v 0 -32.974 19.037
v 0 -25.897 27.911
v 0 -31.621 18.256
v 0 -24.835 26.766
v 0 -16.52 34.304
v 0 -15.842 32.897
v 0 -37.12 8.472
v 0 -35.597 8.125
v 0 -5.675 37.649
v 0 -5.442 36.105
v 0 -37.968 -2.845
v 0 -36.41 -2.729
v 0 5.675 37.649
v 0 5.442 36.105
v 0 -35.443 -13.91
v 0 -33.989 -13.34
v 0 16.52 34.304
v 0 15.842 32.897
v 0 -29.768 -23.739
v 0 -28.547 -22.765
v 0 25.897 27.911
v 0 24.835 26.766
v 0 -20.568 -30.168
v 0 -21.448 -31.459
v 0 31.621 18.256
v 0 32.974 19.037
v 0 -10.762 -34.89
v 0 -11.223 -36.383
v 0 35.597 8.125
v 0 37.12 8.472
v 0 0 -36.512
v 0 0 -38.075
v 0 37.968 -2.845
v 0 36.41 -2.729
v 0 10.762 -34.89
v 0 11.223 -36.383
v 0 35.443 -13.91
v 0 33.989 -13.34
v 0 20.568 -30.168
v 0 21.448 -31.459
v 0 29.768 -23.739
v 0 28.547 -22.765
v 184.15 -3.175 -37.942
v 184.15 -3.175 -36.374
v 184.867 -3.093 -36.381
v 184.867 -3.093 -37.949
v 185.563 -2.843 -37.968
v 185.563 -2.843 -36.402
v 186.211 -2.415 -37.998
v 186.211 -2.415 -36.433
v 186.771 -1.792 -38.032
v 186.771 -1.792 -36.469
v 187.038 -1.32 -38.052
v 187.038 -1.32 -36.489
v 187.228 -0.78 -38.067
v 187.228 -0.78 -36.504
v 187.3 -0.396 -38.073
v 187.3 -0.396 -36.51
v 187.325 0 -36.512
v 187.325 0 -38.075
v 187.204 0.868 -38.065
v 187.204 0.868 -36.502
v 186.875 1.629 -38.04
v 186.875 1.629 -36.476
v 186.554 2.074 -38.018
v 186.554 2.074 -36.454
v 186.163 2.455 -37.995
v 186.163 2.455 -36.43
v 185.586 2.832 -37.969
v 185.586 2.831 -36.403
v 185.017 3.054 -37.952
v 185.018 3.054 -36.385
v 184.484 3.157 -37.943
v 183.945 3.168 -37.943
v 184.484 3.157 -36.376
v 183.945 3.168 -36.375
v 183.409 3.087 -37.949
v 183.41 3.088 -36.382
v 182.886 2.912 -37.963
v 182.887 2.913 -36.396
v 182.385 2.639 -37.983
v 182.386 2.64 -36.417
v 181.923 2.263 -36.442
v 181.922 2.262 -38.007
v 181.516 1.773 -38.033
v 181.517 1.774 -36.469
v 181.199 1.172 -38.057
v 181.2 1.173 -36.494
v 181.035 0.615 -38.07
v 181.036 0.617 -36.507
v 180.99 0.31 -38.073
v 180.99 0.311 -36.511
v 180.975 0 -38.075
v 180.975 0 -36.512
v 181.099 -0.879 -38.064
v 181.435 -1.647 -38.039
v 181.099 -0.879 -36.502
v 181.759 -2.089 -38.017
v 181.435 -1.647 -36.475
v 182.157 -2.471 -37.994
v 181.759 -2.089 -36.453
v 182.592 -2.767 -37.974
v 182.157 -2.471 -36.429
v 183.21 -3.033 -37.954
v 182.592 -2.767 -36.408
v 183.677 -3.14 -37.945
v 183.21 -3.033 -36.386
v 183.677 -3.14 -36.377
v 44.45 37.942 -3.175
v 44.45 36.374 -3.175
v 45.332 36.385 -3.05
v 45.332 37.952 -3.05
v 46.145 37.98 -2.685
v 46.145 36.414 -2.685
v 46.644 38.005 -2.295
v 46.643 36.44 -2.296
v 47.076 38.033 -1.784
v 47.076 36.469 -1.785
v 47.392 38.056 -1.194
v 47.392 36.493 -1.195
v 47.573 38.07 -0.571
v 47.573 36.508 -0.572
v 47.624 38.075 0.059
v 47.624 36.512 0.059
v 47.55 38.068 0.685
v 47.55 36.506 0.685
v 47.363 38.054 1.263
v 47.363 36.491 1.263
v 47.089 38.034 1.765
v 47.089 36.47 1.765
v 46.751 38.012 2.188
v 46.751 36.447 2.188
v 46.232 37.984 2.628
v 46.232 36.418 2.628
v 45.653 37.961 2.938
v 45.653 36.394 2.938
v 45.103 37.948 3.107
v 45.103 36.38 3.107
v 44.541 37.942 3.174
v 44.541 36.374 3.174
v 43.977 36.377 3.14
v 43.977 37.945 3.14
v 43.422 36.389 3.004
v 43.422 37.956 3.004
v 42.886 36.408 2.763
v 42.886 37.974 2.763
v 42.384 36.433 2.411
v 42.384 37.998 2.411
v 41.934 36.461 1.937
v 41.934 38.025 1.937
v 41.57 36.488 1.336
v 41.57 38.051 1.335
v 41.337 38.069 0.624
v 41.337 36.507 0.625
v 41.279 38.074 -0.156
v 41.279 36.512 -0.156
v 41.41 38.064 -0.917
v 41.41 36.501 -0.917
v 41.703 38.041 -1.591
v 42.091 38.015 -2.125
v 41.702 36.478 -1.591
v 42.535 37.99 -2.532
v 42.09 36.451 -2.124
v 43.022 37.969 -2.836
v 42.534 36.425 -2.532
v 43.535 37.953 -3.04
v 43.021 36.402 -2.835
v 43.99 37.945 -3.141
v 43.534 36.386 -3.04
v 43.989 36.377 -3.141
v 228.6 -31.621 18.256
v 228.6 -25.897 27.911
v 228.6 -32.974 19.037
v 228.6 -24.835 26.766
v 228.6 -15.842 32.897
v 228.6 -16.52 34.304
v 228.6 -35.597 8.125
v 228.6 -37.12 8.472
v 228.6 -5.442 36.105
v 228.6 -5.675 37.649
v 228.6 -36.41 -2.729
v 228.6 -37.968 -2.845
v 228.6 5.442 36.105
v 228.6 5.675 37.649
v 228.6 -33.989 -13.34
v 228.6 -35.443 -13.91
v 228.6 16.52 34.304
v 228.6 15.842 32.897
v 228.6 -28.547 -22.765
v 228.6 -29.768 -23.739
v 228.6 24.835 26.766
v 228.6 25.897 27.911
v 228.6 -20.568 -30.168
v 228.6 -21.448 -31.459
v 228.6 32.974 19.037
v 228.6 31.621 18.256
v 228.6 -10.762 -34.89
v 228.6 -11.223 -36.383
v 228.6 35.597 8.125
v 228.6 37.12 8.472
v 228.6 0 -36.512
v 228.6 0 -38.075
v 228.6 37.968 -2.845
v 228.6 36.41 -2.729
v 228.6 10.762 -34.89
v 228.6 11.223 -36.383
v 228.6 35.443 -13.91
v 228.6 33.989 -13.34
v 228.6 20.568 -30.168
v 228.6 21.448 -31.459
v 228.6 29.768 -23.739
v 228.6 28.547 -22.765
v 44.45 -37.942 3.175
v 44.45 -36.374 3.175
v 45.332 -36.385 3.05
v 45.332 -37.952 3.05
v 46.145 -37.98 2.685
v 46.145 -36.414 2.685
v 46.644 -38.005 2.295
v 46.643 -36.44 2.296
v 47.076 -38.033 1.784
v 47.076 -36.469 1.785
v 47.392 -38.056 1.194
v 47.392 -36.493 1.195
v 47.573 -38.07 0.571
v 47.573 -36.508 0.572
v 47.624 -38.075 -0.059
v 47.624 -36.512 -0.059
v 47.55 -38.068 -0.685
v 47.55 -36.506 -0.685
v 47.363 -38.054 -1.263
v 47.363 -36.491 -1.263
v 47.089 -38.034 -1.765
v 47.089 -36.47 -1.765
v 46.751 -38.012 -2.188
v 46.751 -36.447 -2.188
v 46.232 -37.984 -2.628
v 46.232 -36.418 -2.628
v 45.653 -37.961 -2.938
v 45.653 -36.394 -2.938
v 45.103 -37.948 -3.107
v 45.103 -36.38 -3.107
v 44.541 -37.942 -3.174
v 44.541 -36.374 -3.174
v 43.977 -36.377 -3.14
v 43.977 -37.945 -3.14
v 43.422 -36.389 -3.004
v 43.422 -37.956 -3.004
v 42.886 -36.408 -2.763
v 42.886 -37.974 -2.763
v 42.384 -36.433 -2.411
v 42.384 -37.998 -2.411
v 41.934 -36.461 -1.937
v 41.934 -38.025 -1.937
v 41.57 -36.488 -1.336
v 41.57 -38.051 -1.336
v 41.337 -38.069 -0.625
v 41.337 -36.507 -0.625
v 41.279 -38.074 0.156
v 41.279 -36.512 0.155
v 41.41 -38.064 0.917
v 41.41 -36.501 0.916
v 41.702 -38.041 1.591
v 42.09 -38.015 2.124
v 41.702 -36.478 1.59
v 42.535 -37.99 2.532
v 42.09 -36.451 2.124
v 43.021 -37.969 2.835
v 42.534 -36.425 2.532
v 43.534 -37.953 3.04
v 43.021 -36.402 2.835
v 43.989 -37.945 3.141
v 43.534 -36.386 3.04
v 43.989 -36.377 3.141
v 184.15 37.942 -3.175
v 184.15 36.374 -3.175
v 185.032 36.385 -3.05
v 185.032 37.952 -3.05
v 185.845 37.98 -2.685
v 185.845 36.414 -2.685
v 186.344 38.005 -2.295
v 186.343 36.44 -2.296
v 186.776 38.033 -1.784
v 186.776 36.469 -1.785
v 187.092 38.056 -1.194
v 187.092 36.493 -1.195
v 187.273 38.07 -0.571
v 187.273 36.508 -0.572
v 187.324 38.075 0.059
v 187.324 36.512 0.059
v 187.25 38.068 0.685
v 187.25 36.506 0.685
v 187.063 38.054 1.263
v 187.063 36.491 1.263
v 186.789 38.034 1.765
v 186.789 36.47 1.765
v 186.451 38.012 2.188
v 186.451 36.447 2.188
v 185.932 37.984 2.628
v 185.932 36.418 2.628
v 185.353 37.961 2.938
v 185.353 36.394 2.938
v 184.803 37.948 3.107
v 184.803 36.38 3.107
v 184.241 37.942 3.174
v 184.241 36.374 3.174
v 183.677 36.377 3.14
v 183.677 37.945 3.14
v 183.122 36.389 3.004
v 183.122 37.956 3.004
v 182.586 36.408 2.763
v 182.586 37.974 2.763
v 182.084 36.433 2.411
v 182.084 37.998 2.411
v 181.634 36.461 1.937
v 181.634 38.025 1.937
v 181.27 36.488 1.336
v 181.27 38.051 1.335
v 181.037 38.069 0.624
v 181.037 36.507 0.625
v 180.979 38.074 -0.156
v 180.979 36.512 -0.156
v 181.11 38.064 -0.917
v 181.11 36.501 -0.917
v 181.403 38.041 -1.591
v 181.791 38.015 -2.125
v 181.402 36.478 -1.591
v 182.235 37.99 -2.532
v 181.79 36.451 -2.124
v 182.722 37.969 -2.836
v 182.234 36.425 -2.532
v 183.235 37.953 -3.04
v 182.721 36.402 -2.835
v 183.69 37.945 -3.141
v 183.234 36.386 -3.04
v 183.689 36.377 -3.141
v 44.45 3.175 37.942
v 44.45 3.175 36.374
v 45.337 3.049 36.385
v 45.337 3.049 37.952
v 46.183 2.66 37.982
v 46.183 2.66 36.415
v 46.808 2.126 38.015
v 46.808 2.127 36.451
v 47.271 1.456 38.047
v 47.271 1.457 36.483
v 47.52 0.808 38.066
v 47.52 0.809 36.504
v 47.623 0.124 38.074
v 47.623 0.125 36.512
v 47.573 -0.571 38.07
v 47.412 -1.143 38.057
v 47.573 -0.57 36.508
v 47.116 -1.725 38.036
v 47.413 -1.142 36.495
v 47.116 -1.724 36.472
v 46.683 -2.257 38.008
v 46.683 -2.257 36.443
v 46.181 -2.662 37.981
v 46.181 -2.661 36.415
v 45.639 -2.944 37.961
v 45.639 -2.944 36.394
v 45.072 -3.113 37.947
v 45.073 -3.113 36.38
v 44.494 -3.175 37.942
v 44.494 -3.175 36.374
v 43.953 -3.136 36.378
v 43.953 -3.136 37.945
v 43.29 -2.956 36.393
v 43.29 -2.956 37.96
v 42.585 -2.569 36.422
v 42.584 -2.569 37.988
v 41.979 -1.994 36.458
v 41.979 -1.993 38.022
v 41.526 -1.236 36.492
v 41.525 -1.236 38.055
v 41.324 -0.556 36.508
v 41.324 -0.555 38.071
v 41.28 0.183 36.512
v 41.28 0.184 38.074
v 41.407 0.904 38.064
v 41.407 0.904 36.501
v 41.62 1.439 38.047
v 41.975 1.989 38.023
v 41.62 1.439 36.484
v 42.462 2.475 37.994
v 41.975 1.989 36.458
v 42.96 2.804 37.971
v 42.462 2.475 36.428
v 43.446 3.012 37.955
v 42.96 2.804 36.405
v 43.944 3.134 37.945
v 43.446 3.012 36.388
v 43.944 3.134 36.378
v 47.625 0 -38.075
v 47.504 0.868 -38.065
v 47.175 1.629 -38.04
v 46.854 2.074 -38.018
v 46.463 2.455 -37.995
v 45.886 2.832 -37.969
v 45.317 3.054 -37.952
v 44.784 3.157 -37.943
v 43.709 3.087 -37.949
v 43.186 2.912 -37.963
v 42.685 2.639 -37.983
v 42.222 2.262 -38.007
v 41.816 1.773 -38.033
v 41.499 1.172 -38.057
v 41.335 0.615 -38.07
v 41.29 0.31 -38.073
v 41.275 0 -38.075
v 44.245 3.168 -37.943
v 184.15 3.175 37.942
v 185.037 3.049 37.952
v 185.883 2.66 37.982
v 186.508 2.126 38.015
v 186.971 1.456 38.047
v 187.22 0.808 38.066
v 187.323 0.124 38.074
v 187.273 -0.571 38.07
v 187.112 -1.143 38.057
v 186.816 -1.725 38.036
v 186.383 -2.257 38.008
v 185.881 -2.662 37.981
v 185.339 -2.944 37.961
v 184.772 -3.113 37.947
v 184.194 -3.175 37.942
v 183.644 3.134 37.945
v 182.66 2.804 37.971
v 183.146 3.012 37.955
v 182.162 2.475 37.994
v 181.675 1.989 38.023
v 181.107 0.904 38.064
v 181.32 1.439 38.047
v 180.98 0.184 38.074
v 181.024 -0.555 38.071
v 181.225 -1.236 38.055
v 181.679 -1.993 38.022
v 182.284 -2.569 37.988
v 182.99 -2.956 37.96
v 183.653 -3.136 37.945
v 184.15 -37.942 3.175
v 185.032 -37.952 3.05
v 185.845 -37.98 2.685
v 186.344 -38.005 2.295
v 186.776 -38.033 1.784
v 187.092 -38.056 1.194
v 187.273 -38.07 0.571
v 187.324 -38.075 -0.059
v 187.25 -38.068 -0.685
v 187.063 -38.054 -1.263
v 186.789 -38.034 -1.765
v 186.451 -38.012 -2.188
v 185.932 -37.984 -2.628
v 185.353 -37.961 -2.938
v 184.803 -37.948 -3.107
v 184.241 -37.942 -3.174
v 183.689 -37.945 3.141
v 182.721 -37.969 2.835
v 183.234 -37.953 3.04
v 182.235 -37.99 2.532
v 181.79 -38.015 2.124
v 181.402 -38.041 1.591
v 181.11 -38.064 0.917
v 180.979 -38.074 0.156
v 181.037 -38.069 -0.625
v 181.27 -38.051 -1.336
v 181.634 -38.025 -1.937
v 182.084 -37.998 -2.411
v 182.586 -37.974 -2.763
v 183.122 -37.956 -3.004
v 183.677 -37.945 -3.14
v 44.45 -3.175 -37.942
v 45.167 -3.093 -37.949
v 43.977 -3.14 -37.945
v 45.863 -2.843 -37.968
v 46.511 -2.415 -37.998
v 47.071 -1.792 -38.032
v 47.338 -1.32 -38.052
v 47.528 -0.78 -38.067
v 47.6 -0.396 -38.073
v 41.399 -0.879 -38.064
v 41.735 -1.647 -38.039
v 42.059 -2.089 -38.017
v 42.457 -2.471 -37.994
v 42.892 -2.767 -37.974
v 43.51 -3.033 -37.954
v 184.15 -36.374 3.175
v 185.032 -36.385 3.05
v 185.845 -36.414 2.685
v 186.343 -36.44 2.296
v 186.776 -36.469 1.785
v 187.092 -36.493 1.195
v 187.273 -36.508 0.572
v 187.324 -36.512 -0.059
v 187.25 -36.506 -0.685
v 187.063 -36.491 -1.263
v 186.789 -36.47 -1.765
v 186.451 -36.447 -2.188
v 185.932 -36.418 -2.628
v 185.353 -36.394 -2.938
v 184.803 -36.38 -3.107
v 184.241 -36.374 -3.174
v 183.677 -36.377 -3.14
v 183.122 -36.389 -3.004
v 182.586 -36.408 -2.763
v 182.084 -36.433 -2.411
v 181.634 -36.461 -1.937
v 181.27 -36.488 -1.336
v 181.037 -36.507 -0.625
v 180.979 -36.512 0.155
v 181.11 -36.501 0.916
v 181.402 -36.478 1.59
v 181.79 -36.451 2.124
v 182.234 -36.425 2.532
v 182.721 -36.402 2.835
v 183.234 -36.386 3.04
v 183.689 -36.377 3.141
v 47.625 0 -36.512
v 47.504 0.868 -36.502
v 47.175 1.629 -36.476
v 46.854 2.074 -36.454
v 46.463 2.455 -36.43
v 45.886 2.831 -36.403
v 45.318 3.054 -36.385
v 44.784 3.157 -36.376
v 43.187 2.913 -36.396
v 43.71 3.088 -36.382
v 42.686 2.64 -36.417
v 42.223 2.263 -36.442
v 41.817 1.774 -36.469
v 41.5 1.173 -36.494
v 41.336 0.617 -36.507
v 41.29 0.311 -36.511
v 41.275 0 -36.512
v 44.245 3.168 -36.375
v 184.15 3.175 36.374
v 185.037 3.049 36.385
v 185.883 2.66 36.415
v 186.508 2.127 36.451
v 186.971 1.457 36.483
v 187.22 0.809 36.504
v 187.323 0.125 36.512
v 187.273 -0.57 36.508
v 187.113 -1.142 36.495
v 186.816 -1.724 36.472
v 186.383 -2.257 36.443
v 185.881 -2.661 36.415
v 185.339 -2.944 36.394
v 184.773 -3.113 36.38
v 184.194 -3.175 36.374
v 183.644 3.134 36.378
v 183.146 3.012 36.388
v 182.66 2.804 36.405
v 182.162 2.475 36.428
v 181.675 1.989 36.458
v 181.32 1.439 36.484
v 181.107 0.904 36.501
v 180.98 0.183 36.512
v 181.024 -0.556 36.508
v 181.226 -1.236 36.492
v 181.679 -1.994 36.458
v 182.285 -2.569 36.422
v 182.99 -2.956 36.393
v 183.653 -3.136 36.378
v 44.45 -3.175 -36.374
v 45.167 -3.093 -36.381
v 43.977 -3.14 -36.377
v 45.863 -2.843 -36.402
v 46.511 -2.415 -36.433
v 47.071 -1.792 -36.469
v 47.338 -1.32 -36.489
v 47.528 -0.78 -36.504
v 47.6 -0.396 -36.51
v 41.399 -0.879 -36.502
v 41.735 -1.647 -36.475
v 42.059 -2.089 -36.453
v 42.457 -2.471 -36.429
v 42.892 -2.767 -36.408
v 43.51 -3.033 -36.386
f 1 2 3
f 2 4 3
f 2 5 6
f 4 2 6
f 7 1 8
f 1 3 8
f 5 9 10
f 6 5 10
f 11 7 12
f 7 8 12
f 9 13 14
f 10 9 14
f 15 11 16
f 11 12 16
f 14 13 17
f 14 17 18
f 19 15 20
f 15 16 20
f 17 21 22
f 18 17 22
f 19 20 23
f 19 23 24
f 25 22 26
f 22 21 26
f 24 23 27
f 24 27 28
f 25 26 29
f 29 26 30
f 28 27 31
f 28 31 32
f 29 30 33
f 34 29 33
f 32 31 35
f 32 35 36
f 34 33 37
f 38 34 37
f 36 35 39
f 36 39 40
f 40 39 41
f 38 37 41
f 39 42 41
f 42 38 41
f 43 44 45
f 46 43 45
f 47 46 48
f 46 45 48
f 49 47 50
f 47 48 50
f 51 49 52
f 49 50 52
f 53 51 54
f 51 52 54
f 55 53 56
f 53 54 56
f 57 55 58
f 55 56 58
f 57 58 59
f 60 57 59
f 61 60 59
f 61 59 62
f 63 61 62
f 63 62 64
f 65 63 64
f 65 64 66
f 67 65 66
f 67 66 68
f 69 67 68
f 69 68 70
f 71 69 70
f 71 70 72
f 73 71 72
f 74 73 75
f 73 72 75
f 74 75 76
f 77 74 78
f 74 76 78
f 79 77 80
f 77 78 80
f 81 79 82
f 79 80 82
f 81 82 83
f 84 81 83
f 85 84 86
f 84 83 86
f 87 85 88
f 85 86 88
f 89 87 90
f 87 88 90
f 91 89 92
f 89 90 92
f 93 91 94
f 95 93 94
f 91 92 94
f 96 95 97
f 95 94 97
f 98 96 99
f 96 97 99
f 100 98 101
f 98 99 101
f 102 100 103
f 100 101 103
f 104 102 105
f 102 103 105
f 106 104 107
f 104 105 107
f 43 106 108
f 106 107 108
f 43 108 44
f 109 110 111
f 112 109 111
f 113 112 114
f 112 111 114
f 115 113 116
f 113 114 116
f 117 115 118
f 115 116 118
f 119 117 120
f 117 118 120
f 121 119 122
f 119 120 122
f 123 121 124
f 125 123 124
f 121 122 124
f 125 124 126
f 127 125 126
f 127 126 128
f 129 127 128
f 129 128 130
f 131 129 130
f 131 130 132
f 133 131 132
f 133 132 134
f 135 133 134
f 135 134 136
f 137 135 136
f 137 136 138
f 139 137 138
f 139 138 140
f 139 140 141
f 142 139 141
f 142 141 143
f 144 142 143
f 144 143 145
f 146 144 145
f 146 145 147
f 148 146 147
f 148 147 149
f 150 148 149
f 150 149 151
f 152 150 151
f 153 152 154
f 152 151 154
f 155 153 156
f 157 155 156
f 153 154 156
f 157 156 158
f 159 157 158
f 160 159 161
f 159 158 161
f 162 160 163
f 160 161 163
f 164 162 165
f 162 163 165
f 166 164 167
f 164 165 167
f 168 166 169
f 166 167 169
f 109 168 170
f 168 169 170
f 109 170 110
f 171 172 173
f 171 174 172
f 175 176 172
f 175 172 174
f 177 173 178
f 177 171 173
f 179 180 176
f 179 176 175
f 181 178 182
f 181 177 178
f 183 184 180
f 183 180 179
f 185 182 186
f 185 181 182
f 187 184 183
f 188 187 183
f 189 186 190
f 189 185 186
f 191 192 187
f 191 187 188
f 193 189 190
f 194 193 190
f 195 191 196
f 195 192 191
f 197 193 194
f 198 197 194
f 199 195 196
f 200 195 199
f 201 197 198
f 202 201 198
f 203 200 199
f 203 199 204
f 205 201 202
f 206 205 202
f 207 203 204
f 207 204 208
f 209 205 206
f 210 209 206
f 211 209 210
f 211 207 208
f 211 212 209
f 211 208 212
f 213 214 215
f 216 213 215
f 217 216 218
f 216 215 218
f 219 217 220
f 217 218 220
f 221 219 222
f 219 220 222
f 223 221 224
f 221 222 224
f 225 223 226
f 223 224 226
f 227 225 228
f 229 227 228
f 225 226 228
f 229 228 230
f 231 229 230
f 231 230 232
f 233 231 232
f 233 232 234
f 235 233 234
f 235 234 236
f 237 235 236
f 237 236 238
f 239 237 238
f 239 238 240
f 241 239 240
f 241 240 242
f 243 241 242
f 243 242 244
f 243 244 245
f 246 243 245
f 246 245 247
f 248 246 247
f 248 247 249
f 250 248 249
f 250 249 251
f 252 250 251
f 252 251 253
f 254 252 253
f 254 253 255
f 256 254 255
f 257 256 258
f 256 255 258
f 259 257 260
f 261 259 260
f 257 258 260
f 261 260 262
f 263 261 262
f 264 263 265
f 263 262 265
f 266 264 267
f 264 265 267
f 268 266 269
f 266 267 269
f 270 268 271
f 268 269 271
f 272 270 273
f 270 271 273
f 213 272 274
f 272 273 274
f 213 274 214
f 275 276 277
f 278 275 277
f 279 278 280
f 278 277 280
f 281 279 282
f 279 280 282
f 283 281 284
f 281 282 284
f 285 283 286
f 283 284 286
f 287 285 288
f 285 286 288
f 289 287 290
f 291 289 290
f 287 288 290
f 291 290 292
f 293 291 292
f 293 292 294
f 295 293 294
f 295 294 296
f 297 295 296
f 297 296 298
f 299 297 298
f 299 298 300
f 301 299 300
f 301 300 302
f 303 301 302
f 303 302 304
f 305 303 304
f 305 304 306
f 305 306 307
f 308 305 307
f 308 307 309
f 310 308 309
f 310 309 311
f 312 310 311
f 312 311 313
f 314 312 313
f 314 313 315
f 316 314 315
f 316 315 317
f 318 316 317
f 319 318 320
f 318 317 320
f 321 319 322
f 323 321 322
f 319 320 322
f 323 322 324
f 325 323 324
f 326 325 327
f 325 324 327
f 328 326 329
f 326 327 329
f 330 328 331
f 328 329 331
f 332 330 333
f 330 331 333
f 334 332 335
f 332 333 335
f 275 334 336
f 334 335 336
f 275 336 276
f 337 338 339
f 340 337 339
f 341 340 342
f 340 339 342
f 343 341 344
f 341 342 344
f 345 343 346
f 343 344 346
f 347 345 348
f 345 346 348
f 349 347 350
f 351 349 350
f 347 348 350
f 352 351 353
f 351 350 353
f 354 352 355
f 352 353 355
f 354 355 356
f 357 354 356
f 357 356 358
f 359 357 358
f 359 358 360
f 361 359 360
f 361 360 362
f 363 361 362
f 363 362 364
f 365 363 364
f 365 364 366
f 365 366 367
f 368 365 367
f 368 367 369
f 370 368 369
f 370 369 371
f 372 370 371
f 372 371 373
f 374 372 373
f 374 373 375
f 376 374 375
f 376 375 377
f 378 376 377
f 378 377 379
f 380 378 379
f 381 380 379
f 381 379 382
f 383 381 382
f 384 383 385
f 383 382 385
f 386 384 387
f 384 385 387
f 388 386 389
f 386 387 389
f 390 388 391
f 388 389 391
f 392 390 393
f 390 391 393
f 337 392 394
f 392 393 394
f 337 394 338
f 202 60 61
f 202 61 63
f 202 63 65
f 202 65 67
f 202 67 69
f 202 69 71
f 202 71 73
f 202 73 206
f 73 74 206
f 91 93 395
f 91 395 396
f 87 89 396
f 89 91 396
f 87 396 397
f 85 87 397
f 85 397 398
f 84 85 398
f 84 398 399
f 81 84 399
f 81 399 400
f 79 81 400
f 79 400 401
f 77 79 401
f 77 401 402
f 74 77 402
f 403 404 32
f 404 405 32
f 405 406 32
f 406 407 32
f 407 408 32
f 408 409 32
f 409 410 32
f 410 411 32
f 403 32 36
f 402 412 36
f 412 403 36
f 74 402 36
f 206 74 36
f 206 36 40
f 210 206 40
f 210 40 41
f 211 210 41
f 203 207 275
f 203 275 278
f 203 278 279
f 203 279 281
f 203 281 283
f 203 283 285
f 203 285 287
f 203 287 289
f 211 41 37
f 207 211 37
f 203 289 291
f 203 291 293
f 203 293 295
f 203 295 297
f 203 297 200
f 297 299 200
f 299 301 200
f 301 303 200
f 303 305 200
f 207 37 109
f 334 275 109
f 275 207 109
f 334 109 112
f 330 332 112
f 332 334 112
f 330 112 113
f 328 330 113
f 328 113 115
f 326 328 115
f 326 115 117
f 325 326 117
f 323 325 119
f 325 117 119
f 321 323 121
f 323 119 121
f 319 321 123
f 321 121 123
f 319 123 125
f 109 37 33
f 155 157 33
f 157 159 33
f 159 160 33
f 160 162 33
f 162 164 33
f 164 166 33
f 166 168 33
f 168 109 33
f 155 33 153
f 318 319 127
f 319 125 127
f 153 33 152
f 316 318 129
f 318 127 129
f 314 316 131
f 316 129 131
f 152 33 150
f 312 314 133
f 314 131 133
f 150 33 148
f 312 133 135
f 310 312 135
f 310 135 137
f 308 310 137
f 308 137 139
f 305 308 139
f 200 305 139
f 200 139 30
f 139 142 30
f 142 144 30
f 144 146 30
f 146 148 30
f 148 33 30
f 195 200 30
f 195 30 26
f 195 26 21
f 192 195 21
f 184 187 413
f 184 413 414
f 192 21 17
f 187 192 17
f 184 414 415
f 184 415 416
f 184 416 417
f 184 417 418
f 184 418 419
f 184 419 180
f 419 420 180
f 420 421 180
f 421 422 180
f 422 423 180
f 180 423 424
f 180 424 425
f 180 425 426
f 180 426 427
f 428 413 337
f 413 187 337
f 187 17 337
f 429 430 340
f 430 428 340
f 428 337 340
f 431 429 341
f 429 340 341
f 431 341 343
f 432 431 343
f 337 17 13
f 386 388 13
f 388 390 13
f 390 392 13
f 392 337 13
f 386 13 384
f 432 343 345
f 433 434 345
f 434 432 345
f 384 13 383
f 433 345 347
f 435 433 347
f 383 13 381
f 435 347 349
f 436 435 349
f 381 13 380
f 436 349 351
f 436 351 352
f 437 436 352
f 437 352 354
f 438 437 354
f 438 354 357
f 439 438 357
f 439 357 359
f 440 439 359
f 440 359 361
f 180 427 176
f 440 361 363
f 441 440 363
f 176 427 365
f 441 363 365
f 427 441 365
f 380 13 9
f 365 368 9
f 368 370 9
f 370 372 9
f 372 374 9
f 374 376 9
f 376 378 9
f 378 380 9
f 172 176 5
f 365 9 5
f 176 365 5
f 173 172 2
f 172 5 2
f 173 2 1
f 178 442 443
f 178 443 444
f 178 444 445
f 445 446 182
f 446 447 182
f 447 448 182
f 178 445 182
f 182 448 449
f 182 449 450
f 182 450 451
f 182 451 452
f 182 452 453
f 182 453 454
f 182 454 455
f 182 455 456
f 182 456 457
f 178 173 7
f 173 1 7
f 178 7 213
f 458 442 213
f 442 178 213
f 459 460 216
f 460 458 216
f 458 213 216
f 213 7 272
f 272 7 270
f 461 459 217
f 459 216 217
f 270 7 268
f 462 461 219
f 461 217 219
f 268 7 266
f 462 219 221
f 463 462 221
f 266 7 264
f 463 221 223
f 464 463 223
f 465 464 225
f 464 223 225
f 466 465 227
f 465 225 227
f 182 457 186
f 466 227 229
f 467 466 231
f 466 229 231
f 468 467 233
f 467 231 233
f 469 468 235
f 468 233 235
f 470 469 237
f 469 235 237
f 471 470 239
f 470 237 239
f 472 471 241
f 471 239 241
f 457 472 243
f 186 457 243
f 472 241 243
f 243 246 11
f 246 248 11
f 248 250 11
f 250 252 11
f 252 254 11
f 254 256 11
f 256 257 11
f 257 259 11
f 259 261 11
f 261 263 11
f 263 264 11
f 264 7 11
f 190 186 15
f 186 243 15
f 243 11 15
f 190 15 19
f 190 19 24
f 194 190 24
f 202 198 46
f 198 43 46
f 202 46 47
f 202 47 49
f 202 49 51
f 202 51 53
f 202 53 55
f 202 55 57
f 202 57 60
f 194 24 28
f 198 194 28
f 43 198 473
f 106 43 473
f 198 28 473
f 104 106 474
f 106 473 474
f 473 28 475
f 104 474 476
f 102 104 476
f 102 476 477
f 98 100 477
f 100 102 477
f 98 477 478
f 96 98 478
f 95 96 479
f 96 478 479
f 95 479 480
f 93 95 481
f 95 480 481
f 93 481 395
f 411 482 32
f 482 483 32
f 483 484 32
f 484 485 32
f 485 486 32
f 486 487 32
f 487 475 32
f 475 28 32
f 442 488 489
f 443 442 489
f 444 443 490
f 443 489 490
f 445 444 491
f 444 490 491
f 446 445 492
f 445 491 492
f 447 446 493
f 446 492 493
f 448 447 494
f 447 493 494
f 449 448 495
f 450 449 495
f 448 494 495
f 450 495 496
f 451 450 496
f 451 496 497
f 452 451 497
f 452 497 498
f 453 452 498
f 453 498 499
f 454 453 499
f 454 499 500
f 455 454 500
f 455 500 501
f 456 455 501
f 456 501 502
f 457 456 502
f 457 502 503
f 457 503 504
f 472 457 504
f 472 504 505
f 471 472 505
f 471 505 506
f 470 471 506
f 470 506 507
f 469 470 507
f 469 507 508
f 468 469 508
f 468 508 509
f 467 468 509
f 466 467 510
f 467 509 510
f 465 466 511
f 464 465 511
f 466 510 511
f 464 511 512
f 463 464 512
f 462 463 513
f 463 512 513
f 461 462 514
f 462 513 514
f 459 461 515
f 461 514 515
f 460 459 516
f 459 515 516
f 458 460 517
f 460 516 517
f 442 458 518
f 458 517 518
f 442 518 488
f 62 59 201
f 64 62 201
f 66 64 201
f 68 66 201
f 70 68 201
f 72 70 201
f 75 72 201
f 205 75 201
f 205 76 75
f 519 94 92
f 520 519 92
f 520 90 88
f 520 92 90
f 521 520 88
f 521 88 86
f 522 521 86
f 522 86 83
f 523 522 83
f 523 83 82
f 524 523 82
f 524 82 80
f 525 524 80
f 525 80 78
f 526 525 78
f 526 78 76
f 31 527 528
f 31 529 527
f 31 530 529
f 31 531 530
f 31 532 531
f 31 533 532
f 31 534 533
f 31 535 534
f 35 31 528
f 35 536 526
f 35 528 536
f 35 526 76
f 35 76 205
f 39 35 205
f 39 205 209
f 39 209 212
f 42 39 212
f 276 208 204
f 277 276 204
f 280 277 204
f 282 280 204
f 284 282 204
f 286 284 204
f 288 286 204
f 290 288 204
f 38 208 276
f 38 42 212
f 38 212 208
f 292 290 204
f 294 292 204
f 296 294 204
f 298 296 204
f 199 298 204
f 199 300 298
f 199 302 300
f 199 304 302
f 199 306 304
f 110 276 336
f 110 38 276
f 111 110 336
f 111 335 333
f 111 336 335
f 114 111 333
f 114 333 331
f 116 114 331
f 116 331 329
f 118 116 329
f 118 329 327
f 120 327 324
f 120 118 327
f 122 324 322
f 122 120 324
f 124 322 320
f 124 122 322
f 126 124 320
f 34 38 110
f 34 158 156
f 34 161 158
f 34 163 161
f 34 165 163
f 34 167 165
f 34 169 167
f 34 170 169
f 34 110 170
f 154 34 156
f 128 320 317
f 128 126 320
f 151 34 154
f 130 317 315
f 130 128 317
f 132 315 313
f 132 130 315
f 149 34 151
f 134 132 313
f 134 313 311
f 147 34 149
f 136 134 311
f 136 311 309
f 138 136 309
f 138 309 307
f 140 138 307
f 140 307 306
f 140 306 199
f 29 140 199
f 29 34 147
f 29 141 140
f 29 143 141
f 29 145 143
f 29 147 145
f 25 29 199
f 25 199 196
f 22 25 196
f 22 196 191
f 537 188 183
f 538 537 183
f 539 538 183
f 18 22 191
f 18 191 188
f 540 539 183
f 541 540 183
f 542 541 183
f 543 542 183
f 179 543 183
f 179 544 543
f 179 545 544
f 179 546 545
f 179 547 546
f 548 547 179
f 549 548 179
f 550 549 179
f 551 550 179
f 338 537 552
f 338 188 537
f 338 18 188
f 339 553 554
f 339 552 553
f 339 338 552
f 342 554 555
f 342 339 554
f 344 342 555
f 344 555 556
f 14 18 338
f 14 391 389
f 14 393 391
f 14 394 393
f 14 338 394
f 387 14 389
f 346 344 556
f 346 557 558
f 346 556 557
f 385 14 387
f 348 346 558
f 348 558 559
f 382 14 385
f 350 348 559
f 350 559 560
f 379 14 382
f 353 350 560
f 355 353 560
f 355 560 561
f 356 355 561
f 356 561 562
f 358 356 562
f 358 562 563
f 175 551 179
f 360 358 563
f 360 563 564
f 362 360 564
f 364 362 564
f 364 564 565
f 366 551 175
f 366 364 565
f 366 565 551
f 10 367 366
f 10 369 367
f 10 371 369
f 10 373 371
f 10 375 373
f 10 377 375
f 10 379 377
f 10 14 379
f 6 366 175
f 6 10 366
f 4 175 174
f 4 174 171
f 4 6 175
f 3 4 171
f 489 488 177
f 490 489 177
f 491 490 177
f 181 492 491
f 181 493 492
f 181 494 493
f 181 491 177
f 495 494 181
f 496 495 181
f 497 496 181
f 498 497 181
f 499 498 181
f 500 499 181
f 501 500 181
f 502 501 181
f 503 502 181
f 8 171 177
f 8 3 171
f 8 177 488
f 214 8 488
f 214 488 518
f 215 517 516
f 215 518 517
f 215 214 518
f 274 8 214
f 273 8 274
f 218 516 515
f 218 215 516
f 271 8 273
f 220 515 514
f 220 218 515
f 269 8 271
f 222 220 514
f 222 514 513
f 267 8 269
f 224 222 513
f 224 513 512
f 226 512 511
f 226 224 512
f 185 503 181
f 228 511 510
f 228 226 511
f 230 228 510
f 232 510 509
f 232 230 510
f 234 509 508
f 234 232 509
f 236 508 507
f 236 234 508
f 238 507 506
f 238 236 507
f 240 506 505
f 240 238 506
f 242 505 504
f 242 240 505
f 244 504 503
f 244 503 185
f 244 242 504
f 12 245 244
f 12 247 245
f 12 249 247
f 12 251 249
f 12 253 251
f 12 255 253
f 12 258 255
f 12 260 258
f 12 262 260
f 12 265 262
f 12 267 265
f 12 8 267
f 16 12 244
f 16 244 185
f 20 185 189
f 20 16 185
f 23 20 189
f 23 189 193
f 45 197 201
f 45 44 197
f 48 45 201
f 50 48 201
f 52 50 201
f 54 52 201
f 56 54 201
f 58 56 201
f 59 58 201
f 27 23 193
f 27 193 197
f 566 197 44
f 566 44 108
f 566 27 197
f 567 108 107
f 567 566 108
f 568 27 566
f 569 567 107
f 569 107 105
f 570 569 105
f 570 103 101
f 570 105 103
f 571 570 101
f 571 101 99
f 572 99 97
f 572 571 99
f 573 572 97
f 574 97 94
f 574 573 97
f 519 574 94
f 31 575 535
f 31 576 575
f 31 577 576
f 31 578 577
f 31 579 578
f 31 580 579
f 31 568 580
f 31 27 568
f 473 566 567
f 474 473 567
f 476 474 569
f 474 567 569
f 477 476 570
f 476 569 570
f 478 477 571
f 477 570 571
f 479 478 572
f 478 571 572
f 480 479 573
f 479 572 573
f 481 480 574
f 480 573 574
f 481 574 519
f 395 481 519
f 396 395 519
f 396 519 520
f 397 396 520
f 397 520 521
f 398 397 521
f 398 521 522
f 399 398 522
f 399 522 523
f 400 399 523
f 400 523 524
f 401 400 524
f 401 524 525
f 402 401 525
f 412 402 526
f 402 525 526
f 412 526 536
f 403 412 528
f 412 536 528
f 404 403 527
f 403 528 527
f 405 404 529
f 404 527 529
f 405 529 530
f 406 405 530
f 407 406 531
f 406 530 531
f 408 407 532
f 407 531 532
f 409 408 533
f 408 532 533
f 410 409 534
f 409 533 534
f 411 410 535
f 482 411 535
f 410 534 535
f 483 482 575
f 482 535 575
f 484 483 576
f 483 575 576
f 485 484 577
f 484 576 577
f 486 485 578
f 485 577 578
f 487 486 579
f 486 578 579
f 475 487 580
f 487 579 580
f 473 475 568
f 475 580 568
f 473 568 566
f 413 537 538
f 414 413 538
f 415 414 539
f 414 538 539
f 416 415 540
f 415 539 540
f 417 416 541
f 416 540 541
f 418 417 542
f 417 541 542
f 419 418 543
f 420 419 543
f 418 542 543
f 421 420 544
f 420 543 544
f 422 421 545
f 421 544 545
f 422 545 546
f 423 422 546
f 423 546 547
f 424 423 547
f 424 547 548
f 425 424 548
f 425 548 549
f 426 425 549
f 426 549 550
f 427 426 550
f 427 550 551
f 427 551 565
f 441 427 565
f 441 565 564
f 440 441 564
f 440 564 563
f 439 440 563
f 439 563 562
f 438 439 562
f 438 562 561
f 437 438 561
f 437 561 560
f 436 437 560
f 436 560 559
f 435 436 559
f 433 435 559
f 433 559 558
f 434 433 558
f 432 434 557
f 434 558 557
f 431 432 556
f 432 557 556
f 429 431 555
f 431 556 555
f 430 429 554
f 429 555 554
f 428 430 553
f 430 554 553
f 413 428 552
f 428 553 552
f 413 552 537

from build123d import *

# Parameters (mm, degrees)
SKETCH1_R           = 38.0746
SKETCH1_R_2         = 36.5125
BOSS_EXTRUDE1_DEPTH = 228.6
SKETCH2_R           = 3.175
CUT_EXTRUDE1_DEPTH  = 235.855935267
CIRPATTERN1_COUNT   = 4
SKETCH3_R           = 3.175
CUT_EXTRUDE2_DEPTH  = 235.855935397
CIRPATTERN2_COUNT   = 4


with BuildPart() as part:
    # Sketch1 → Boss-Extrude1 (new body)
    with BuildSketch(Plane.YZ):
        with Locations(Location((0, 0, 0), (0, 0, 270))):
            Circle(SKETCH1_R)
        with Locations(Location((0, 0, 0), (0, 0, 270))):
            Circle(SKETCH1_R_2, mode=Mode.SUBTRACT)
    extrude(amount=BOSS_EXTRUDE1_DEPTH)

    # Sketch2 → Cut-Extrude1 (cut, through all)
    with BuildSketch(Plane(origin=(0, 0, 0), x_dir=(-1, 0, 0), z_dir=(0, 1, 0))):
        with Locations(Location((-184.15, 0, 0), (0, 0, 90))):
            Circle(SKETCH2_R)
    cut_extrude1 = extrude(amount=-CUT_EXTRUDE1_DEPTH, mode=Mode.SUBTRACT)

    # CirPattern1: Cut-Extrude1 ×4 about axis
    cirpattern1_axis = Axis((228.6, 0, 0), (-1, 0, 0))
    for i in range(1, CIRPATTERN1_COUNT):
        add(cut_extrude1.rotate(cirpattern1_axis, i * 360 / CIRPATTERN1_COUNT), mode=Mode.SUBTRACT)

    # Sketch3 → Cut-Extrude2 (cut, through all)
    with BuildSketch(Plane(origin=(0, 0, 0), x_dir=(-1, 0, 0), z_dir=(0, 1, 0))):
        with Locations(Location((-44.45, 0, 0), (0, 0, 90))):
            Circle(SKETCH3_R)
    cut_extrude2 = extrude(amount=-CUT_EXTRUDE2_DEPTH, mode=Mode.SUBTRACT)

    # CirPattern2: Cut-Extrude2 ×4 about axis
    cirpattern2_axis = Axis((228.6, 0, 0), (-1, 0, 0))
    for i in range(1, CIRPATTERN2_COUNT):
        add(cut_extrude2.rotate(cirpattern2_axis, i * 360 / CIRPATTERN2_COUNT), mode=Mode.SUBTRACT)


solid = part.part
